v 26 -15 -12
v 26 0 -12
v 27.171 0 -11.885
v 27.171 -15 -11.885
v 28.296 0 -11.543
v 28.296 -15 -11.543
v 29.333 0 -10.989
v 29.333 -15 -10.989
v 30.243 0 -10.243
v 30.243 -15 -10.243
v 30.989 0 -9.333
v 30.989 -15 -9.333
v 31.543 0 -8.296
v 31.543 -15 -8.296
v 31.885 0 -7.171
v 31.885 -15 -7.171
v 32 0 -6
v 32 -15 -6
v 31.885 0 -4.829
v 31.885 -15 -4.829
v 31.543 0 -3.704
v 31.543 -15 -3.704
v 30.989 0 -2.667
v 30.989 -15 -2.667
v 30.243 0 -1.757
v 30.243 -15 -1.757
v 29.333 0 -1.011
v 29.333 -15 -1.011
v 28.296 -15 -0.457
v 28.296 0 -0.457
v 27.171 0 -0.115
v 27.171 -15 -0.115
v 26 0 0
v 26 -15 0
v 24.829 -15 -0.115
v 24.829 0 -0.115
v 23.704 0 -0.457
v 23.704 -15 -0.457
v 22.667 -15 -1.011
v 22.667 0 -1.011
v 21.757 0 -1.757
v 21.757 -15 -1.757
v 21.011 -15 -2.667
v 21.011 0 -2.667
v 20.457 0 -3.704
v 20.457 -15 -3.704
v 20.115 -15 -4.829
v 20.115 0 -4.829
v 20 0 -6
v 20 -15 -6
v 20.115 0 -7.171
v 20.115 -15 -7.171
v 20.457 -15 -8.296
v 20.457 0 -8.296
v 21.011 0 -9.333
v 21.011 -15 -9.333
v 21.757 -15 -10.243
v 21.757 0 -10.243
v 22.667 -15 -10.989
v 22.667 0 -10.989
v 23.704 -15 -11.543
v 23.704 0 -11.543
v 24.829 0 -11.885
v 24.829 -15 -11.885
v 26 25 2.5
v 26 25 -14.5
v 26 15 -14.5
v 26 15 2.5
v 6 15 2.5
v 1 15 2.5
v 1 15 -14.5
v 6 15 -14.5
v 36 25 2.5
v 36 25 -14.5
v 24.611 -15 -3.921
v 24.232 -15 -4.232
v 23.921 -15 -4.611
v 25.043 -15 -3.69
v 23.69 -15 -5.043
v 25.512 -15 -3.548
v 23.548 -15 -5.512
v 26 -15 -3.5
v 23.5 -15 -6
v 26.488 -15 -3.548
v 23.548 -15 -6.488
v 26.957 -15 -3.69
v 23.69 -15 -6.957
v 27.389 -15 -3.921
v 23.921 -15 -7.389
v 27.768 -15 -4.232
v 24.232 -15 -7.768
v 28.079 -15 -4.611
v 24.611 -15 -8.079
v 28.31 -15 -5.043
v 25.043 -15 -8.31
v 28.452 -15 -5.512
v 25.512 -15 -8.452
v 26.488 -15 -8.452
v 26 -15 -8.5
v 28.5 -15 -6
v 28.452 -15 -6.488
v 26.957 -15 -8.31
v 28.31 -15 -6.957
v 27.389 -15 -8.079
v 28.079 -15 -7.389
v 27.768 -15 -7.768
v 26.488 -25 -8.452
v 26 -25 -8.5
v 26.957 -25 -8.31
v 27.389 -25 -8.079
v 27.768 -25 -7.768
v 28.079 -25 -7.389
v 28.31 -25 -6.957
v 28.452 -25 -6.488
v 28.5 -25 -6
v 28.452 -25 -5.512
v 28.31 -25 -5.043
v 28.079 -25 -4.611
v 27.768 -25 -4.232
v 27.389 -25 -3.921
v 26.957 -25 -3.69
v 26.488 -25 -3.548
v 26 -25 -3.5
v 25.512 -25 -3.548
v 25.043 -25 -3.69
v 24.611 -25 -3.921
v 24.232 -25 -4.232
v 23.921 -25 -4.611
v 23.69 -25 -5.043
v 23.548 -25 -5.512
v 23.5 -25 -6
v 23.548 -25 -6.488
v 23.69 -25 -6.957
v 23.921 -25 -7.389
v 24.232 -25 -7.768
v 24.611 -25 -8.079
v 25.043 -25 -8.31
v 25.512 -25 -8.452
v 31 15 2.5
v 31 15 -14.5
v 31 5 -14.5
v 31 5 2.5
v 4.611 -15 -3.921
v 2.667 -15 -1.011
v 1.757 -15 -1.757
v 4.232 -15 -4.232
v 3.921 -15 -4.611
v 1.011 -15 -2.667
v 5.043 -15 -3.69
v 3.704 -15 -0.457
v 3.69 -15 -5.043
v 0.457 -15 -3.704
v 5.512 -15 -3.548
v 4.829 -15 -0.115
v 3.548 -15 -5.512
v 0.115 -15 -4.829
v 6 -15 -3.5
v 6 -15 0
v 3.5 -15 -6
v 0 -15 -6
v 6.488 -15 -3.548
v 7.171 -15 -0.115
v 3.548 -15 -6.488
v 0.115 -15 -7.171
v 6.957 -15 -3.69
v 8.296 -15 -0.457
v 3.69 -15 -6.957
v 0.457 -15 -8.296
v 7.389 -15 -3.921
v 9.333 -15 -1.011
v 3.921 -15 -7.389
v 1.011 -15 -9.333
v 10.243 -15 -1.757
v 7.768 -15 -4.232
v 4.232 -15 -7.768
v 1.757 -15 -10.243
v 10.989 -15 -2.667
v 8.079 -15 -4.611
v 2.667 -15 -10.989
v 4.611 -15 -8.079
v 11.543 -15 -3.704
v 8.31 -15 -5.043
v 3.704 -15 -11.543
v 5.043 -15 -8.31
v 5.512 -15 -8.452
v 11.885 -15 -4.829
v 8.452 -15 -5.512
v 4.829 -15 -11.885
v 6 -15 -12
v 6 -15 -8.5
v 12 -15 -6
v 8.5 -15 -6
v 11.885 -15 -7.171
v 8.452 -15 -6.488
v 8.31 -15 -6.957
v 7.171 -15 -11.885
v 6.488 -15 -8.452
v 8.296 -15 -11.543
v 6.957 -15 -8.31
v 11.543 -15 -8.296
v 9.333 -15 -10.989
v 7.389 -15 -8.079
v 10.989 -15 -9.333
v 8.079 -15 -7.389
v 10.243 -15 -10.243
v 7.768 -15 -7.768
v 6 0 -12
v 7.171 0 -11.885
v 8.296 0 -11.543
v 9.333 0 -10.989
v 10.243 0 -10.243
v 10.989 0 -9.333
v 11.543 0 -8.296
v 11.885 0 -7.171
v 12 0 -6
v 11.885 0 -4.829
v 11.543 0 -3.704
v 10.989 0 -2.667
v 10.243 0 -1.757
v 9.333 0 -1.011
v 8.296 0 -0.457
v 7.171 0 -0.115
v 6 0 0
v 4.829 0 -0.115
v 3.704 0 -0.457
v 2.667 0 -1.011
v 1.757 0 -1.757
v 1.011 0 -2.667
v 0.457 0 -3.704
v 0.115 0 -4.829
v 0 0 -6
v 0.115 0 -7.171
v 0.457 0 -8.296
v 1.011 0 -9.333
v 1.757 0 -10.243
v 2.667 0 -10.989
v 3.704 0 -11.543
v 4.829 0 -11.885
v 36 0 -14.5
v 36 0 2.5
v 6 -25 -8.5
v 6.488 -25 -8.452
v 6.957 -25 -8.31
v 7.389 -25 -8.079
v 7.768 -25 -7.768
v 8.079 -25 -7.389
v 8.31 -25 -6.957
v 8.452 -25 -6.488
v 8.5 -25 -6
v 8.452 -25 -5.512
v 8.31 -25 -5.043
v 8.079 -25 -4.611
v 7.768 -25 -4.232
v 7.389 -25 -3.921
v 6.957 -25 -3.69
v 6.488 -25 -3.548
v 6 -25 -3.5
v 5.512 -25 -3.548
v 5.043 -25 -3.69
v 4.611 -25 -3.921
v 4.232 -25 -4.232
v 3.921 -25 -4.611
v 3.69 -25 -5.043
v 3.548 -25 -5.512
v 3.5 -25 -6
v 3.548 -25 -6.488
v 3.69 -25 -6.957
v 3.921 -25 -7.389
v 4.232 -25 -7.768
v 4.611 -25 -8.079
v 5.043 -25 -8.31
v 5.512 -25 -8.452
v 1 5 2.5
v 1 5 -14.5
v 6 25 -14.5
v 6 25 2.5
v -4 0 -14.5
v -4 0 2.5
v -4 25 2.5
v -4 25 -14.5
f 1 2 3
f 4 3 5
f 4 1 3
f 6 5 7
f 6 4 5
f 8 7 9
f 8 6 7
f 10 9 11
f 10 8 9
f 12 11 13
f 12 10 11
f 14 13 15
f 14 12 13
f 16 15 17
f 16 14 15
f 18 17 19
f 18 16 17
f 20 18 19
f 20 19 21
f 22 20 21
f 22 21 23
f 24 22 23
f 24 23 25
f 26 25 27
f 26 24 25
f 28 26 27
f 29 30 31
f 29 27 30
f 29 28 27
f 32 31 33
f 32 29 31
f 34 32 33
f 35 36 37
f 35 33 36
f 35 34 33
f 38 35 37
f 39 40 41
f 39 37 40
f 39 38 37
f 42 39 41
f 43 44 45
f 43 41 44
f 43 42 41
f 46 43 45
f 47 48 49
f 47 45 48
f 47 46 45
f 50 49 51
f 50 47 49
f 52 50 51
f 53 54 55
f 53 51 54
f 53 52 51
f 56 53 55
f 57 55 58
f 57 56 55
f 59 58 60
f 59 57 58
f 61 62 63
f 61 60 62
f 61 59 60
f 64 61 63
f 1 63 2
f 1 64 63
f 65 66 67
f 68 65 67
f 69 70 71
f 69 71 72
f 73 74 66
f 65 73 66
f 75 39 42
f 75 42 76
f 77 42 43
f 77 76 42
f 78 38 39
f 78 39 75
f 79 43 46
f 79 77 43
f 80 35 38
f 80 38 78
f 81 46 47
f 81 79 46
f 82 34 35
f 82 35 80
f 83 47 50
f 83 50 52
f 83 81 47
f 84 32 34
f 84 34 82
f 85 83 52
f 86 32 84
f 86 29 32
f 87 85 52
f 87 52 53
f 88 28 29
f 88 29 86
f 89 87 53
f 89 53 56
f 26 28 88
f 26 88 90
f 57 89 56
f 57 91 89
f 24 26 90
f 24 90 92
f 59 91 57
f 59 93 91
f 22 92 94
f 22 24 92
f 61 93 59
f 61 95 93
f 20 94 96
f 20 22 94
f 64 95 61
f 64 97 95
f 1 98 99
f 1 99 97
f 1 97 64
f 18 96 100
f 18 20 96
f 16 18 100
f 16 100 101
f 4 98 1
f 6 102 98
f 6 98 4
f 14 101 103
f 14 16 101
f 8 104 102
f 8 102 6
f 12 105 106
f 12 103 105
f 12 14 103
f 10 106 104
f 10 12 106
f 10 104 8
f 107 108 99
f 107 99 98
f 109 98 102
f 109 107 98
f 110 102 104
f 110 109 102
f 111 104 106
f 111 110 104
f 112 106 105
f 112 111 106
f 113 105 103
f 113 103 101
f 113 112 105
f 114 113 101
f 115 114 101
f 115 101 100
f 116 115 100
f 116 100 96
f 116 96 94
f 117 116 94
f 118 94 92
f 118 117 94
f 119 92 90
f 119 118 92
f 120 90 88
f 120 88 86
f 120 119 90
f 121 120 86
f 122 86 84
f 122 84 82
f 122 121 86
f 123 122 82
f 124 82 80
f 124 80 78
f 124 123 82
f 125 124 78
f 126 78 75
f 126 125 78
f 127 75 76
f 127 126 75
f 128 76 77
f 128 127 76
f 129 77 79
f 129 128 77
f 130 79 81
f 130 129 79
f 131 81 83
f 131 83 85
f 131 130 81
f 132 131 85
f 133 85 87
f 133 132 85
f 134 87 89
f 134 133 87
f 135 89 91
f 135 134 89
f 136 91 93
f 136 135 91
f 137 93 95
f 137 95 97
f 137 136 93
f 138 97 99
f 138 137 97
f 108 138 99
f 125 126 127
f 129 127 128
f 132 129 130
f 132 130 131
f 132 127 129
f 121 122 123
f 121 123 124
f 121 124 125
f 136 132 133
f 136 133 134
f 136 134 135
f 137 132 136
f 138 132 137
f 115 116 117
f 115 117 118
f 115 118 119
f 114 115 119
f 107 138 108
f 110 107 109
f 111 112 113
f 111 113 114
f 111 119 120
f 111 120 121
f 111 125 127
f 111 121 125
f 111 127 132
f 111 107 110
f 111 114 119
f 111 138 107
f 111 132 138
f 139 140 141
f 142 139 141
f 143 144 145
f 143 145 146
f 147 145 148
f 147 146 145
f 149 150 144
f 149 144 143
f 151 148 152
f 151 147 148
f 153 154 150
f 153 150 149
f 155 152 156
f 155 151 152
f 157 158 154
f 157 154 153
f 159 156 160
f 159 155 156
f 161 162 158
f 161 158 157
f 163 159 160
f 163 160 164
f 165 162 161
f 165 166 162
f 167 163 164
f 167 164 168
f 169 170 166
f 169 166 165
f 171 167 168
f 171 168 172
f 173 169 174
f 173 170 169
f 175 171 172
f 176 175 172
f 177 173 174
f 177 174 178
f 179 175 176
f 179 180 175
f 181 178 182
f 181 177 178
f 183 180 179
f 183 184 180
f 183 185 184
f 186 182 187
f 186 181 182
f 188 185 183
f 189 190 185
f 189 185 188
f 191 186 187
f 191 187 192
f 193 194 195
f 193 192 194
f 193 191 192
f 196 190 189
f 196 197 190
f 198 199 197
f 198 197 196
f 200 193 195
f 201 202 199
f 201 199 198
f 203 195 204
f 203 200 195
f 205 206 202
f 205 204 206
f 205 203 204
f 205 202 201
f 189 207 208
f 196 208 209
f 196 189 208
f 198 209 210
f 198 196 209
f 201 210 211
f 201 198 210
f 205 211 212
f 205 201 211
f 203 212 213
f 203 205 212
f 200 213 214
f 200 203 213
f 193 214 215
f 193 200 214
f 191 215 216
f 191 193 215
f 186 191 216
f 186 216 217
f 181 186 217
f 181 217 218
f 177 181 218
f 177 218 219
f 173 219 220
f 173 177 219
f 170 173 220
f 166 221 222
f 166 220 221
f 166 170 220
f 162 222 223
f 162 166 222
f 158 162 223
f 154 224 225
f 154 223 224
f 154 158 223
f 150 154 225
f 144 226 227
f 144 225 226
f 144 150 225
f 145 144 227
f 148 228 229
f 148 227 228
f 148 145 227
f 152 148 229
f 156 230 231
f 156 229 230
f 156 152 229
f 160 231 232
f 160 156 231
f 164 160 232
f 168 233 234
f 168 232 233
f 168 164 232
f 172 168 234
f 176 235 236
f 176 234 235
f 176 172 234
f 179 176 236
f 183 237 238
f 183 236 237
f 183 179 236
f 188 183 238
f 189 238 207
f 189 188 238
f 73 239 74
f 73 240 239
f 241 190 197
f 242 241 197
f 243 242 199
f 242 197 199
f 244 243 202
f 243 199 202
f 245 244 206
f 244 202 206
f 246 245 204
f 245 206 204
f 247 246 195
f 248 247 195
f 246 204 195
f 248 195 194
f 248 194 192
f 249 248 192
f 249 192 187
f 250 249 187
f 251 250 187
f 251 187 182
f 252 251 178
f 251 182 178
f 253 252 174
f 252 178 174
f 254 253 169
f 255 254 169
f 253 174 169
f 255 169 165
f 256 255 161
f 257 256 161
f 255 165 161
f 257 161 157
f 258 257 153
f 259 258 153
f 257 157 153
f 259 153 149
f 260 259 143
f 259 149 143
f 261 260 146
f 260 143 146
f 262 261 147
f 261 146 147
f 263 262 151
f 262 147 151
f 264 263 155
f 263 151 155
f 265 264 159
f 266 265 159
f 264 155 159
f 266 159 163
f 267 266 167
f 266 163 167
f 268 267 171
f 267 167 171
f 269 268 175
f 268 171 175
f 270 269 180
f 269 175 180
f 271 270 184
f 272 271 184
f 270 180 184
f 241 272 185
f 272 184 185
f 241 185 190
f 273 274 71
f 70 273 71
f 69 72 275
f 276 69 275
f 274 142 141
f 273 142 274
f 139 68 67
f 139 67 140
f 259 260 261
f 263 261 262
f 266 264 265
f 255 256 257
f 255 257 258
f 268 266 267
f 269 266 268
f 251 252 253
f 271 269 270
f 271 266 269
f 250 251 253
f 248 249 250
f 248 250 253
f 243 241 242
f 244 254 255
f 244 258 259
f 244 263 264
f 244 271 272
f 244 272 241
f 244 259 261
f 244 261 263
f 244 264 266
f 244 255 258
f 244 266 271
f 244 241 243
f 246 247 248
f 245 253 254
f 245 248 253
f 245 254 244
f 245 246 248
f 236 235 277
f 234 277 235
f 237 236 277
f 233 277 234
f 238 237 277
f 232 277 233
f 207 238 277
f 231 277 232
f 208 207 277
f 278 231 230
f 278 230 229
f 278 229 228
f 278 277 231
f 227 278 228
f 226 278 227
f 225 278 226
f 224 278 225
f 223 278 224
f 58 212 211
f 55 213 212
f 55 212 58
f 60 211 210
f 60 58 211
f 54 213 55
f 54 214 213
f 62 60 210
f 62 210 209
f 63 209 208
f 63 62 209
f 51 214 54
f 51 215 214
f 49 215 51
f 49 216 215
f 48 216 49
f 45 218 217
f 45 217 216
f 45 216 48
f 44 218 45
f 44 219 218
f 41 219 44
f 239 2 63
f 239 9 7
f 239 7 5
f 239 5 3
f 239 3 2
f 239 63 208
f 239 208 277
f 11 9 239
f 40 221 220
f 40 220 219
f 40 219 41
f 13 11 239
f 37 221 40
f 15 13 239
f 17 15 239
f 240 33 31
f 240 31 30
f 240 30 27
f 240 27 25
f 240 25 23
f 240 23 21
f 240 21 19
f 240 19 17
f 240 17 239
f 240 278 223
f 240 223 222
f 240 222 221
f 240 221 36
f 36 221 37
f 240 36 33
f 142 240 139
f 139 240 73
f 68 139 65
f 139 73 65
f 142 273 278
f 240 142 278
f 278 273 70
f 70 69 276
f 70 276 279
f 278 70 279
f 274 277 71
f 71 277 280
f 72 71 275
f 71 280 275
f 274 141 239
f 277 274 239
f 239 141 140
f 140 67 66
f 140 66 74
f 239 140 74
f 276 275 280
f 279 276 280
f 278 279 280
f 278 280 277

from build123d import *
from build123d.topology import SkipClean

# Parameters (mm, degrees)
SKETCH_3_W          = 32
SKETCH_3_H          = 12
EXTRUDE_3_DEPTH     = 5
SKETCH_4_R          = 5
EXTRUDE_4_DEPTH     = 10
SKETCH_8_R          = 5
EXTRUDE_6_DEPTH     = 5
SKETCH_9_R          = 4.8
CUT_EXTRUDE_2_DEPTH = 0.5
EXTRUDE_START       = 5
SKETCH_36_R         = 5
SKETCH_36_R_2       = 4.98
EXTRUDE_11_DEPTH    = 5
SKETCH_46_W         = 32
SKETCH_46_H         = 12
EXTRUDE_12_DEPTH    = 20
SKETCH_47_W         = 4
SKETCH_47_H         = 25
EXTRUDE_13_DEPTH    = 12
SKETCH_48_W         = 4
SKETCH_48_H         = 25
EXTRUDE_14_DEPTH    = 12
CUT_EXTRUDE_START   = -12
CUT_EXTRUDE_5_DEPTH = 12
SKETCH_50_R         = 6
EXTRUDE_15_DEPTH    = 20
SKETCH_51_R         = 6
EXTRUDE_16_DEPTH    = 20
SKETCH_54_R         = 6
EXTRUDE_17_DEPTH    = 25
SKETCH_55_R         = 6
EXTRUDE_18_DEPTH    = 25
SKETCH_56_R         = 6
CUT_EXTRUDE_6_DEPTH = 10
SKETCH_57_R         = 2.5
EXTRUDE_19_DEPTH    = 10
SKETCH_58_R         = 6
SKETCH_58_R_2       = 2.5
CUT_EXTRUDE_8_DEPTH = 10
EXTRUDE_20_DEPTH    = 2.5
EXTRUDE_21_DEPTH    = 2.5


# Read off the part's stored shape, not the designer's step: the extrude step
with BuildPart() as part:
    # Sketch 3 → Extrude 3 (new body)
    with BuildSketch(Plane(origin=(0, 0, 0), x_dir=(1, 0, 0), z_dir=(0, 1, 0))):
        with Locations((16, 6)):
            Rectangle(SKETCH_3_W, SKETCH_3_H)
    extrude(amount=EXTRUDE_3_DEPTH)

    # Sketch 4 → Extrude 4 (add)
    with BuildSketch(Plane.XZ):
        with Locations(Location((6, -6, 0), (0, 0, 270))):
            Circle(SKETCH_4_R)
        with Locations(Location((26, -6, 0), (0, 0, 270))):
            Circle(SKETCH_4_R)
    extrude(amount=EXTRUDE_4_DEPTH)

    # Sketch 8 → Extrude 6 (add)
    with BuildSketch(Plane.XZ.offset(10)):
        with Locations(Location((6, -6, 0), (0, 0, 270))):
            Circle(SKETCH_8_R)
    extrude(amount=EXTRUDE_6_DEPTH)

    # Sketch 9 → Cut-Extrude 2 (cut)
    with BuildSketch(Plane.XZ.offset(15)):
        with Locations(Location((6, -6, 0), (0, 0, 270))):
            Circle(SKETCH_9_R)
    extrude(amount=-CUT_EXTRUDE_2_DEPTH, mode=Mode.SUBTRACT)



with BuildPart() as body_2:
    # Sketch 14 → Revolve 2 (revolve)
    with BuildSketch(Plane.XY.offset(-6), mode=Mode.PRIVATE) as revolve_2_sk:
        Polygon((1.021282046, -15), (1.021282046, -20), (1.221282046, -15), align=None)
    revolve(revolve_2_sk.sketch.rotate(Axis((6, -15, -6), (0, 1, 0)), 270), axis=Axis((6, -15, -6), (0, 1, 0)))


with BuildPart() as part_1:
    with SkipClean():  # the faces are left unmerged after this step: merging them gives an invalid solid
        add(part.part)

        add(body_2.part)  # Extrude 11 merges body 2
        # Sketch 36 → Extrude 11 (add)
        with BuildSketch(Plane(origin=(0, -20, 0), x_dir=(1, 0, 0), z_dir=(0, 1, 0)).offset(EXTRUDE_START)):
            with Locations(Location((6, 6, 0), (0, 0, 270))):
                Circle(SKETCH_36_R)
            with Locations(Location((6, 6, 0), (0, 0, 90))):
                Circle(SKETCH_36_R_2, mode=Mode.SUBTRACT)
        extrude(amount=-EXTRUDE_11_DEPTH)

    # Sketch 46 → Extrude 12 (add)
    with SkipClean():  # the faces are left unmerged after this step: merging them gives an invalid solid
        with BuildSketch(Plane(origin=(0, 5, 0), x_dir=(1, 0, 0), z_dir=(0, 1, 0))):
            with Locations((16, 6)):
                Rectangle(SKETCH_46_W, SKETCH_46_H)
        extrude(amount=EXTRUDE_12_DEPTH)

    # Sketch 47 → Extrude 13 (add)
    with SkipClean():  # the faces are left unmerged after this step: merging them gives an invalid solid
        with BuildSketch(Plane.XY):
            with Locations((-2, 12.5)):
                Rectangle(SKETCH_47_W, SKETCH_47_H)
        extrude(amount=-EXTRUDE_13_DEPTH)

    # Sketch 48 → Extrude 14 (add)
    with SkipClean():  # the faces are left unmerged after this step: merging them gives an invalid solid
        with BuildSketch(Plane.XY):
            with Locations((34, 12.5)):
                Rectangle(SKETCH_48_W, SKETCH_48_H)
        extrude(amount=-EXTRUDE_14_DEPTH)

    # Cut-Extrude 5 outline → Cut-Extrude 5 (cut)
    with SkipClean():  # the faces are left unmerged after this step: merging them gives an invalid solid
        with BuildSketch(Plane.XY.offset(CUT_EXTRUDE_START)):
            Polygon((26, 25), (6, 25), (6, 15), (1, 15), (1, 5), (31, 5), (31, 15), (26, 15), align=None)
        extrude(amount=CUT_EXTRUDE_5_DEPTH, mode=Mode.SUBTRACT)

    # Sketch 50 → Extrude 15 (add)
    with BuildSketch(Plane.XZ):
        with Locations(Location((6, -6, 0), (0, 0, 270))):
            Circle(SKETCH_50_R)
    extrude(amount=EXTRUDE_15_DEPTH)

    # Sketch 51 → Extrude 16 (add)
    with BuildSketch(Plane.XZ):
        with Locations(Location((26, -6, 0), (0, 0, 270))):
            Circle(SKETCH_51_R)
    extrude(amount=EXTRUDE_16_DEPTH)

    # Sketch 52 → Revolve 3 (revolve)
    with BuildSketch(Plane.XY.offset(-6), mode=Mode.PRIVATE) as revolve_3_sk:
        Polygon((0, -20), (0, -25), (0.2, -20), align=None)
    revolve(revolve_3_sk.sketch.rotate(Axis((6, -20, -6), (0, -1, 0)), 270), axis=Axis((6, -20, -6), (0, -1, 0)))

    # Sketch 53 → Revolve 4 (revolve)
    with BuildSketch(Plane.XY.offset(-6), mode=Mode.PRIVATE) as revolve_4_sk:
        Polygon((20, -20), (20, -25), (20.2, -20), align=None)
    revolve(revolve_4_sk.sketch.rotate(Axis((26, -20, -6), (0, -1, 0)), 270), axis=Axis((26, -20, -6), (0, -1, 0)))

    # Sketch 54 → Extrude 17 (add)
    with BuildSketch(Plane.XZ):
        with Locations(Location((6, -6, 0), (0, 0, 270))):
            Circle(SKETCH_54_R)
    extrude(amount=EXTRUDE_17_DEPTH)

    # Sketch 55 → Extrude 18 (add)
    with BuildSketch(Plane.XZ):
        with Locations(Location((26, -6, 0), (0, 0, 270))):
            Circle(SKETCH_55_R)
    extrude(amount=EXTRUDE_18_DEPTH)

    # Sketch 56 → Cut-Extrude 6 (cut)
    with BuildSketch(Plane.XZ.offset(25)):
        with Locations(Location((6, -6, 0), (0, 0, 270))):
            Circle(SKETCH_56_R)
    extrude(amount=-CUT_EXTRUDE_6_DEPTH, mode=Mode.SUBTRACT)

    # Sketch 57 → Extrude 19 (add)
    with BuildSketch(Plane.XZ.offset(15)):
        with Locations(Location((6, -6, 0), (0, 0, 270))):
            Circle(SKETCH_57_R)
    extrude(amount=EXTRUDE_19_DEPTH)

    # Sketch 58 → Cut-Extrude 8 (cut)
    with BuildSketch(Plane.XZ.offset(25)):
        with Locations(Location((26, -6, 0), (0, 0, 270))):
            Circle(SKETCH_58_R)
        with Locations(Location((26, -6, 0), (0, 0, 270))):
            Circle(SKETCH_58_R_2, mode=Mode.SUBTRACT)
    extrude(amount=-CUT_EXTRUDE_8_DEPTH, mode=Mode.SUBTRACT)

    # Sketch 60 → Extrude 20 (add)
    with BuildSketch(Plane.XY):
        Polygon((-4, 25), (6, 25), (6, 15), (1, 15), (1, 5), (31, 5), (31, 15), (26, 15), (26, 25), (36, 25), (36, 0), (-4, 0), align=None)
    extrude(amount=EXTRUDE_20_DEPTH)

    # Sketch 61 → Extrude 21 (add)
    with BuildSketch(Plane(origin=(0, 0, -12), x_dir=(-1, 0, 0), z_dir=(0, 0, -1))):
        Polygon((-36, 25), (-26, 25), (-26, 15), (-31, 15), (-31, 5), (-1, 5), (-1, 15), (-6, 15), (-6, 25), (4, 25), (4, 0), (-36, 0), align=None)
    extrude(amount=EXTRUDE_21_DEPTH)


solid = part_1.part
